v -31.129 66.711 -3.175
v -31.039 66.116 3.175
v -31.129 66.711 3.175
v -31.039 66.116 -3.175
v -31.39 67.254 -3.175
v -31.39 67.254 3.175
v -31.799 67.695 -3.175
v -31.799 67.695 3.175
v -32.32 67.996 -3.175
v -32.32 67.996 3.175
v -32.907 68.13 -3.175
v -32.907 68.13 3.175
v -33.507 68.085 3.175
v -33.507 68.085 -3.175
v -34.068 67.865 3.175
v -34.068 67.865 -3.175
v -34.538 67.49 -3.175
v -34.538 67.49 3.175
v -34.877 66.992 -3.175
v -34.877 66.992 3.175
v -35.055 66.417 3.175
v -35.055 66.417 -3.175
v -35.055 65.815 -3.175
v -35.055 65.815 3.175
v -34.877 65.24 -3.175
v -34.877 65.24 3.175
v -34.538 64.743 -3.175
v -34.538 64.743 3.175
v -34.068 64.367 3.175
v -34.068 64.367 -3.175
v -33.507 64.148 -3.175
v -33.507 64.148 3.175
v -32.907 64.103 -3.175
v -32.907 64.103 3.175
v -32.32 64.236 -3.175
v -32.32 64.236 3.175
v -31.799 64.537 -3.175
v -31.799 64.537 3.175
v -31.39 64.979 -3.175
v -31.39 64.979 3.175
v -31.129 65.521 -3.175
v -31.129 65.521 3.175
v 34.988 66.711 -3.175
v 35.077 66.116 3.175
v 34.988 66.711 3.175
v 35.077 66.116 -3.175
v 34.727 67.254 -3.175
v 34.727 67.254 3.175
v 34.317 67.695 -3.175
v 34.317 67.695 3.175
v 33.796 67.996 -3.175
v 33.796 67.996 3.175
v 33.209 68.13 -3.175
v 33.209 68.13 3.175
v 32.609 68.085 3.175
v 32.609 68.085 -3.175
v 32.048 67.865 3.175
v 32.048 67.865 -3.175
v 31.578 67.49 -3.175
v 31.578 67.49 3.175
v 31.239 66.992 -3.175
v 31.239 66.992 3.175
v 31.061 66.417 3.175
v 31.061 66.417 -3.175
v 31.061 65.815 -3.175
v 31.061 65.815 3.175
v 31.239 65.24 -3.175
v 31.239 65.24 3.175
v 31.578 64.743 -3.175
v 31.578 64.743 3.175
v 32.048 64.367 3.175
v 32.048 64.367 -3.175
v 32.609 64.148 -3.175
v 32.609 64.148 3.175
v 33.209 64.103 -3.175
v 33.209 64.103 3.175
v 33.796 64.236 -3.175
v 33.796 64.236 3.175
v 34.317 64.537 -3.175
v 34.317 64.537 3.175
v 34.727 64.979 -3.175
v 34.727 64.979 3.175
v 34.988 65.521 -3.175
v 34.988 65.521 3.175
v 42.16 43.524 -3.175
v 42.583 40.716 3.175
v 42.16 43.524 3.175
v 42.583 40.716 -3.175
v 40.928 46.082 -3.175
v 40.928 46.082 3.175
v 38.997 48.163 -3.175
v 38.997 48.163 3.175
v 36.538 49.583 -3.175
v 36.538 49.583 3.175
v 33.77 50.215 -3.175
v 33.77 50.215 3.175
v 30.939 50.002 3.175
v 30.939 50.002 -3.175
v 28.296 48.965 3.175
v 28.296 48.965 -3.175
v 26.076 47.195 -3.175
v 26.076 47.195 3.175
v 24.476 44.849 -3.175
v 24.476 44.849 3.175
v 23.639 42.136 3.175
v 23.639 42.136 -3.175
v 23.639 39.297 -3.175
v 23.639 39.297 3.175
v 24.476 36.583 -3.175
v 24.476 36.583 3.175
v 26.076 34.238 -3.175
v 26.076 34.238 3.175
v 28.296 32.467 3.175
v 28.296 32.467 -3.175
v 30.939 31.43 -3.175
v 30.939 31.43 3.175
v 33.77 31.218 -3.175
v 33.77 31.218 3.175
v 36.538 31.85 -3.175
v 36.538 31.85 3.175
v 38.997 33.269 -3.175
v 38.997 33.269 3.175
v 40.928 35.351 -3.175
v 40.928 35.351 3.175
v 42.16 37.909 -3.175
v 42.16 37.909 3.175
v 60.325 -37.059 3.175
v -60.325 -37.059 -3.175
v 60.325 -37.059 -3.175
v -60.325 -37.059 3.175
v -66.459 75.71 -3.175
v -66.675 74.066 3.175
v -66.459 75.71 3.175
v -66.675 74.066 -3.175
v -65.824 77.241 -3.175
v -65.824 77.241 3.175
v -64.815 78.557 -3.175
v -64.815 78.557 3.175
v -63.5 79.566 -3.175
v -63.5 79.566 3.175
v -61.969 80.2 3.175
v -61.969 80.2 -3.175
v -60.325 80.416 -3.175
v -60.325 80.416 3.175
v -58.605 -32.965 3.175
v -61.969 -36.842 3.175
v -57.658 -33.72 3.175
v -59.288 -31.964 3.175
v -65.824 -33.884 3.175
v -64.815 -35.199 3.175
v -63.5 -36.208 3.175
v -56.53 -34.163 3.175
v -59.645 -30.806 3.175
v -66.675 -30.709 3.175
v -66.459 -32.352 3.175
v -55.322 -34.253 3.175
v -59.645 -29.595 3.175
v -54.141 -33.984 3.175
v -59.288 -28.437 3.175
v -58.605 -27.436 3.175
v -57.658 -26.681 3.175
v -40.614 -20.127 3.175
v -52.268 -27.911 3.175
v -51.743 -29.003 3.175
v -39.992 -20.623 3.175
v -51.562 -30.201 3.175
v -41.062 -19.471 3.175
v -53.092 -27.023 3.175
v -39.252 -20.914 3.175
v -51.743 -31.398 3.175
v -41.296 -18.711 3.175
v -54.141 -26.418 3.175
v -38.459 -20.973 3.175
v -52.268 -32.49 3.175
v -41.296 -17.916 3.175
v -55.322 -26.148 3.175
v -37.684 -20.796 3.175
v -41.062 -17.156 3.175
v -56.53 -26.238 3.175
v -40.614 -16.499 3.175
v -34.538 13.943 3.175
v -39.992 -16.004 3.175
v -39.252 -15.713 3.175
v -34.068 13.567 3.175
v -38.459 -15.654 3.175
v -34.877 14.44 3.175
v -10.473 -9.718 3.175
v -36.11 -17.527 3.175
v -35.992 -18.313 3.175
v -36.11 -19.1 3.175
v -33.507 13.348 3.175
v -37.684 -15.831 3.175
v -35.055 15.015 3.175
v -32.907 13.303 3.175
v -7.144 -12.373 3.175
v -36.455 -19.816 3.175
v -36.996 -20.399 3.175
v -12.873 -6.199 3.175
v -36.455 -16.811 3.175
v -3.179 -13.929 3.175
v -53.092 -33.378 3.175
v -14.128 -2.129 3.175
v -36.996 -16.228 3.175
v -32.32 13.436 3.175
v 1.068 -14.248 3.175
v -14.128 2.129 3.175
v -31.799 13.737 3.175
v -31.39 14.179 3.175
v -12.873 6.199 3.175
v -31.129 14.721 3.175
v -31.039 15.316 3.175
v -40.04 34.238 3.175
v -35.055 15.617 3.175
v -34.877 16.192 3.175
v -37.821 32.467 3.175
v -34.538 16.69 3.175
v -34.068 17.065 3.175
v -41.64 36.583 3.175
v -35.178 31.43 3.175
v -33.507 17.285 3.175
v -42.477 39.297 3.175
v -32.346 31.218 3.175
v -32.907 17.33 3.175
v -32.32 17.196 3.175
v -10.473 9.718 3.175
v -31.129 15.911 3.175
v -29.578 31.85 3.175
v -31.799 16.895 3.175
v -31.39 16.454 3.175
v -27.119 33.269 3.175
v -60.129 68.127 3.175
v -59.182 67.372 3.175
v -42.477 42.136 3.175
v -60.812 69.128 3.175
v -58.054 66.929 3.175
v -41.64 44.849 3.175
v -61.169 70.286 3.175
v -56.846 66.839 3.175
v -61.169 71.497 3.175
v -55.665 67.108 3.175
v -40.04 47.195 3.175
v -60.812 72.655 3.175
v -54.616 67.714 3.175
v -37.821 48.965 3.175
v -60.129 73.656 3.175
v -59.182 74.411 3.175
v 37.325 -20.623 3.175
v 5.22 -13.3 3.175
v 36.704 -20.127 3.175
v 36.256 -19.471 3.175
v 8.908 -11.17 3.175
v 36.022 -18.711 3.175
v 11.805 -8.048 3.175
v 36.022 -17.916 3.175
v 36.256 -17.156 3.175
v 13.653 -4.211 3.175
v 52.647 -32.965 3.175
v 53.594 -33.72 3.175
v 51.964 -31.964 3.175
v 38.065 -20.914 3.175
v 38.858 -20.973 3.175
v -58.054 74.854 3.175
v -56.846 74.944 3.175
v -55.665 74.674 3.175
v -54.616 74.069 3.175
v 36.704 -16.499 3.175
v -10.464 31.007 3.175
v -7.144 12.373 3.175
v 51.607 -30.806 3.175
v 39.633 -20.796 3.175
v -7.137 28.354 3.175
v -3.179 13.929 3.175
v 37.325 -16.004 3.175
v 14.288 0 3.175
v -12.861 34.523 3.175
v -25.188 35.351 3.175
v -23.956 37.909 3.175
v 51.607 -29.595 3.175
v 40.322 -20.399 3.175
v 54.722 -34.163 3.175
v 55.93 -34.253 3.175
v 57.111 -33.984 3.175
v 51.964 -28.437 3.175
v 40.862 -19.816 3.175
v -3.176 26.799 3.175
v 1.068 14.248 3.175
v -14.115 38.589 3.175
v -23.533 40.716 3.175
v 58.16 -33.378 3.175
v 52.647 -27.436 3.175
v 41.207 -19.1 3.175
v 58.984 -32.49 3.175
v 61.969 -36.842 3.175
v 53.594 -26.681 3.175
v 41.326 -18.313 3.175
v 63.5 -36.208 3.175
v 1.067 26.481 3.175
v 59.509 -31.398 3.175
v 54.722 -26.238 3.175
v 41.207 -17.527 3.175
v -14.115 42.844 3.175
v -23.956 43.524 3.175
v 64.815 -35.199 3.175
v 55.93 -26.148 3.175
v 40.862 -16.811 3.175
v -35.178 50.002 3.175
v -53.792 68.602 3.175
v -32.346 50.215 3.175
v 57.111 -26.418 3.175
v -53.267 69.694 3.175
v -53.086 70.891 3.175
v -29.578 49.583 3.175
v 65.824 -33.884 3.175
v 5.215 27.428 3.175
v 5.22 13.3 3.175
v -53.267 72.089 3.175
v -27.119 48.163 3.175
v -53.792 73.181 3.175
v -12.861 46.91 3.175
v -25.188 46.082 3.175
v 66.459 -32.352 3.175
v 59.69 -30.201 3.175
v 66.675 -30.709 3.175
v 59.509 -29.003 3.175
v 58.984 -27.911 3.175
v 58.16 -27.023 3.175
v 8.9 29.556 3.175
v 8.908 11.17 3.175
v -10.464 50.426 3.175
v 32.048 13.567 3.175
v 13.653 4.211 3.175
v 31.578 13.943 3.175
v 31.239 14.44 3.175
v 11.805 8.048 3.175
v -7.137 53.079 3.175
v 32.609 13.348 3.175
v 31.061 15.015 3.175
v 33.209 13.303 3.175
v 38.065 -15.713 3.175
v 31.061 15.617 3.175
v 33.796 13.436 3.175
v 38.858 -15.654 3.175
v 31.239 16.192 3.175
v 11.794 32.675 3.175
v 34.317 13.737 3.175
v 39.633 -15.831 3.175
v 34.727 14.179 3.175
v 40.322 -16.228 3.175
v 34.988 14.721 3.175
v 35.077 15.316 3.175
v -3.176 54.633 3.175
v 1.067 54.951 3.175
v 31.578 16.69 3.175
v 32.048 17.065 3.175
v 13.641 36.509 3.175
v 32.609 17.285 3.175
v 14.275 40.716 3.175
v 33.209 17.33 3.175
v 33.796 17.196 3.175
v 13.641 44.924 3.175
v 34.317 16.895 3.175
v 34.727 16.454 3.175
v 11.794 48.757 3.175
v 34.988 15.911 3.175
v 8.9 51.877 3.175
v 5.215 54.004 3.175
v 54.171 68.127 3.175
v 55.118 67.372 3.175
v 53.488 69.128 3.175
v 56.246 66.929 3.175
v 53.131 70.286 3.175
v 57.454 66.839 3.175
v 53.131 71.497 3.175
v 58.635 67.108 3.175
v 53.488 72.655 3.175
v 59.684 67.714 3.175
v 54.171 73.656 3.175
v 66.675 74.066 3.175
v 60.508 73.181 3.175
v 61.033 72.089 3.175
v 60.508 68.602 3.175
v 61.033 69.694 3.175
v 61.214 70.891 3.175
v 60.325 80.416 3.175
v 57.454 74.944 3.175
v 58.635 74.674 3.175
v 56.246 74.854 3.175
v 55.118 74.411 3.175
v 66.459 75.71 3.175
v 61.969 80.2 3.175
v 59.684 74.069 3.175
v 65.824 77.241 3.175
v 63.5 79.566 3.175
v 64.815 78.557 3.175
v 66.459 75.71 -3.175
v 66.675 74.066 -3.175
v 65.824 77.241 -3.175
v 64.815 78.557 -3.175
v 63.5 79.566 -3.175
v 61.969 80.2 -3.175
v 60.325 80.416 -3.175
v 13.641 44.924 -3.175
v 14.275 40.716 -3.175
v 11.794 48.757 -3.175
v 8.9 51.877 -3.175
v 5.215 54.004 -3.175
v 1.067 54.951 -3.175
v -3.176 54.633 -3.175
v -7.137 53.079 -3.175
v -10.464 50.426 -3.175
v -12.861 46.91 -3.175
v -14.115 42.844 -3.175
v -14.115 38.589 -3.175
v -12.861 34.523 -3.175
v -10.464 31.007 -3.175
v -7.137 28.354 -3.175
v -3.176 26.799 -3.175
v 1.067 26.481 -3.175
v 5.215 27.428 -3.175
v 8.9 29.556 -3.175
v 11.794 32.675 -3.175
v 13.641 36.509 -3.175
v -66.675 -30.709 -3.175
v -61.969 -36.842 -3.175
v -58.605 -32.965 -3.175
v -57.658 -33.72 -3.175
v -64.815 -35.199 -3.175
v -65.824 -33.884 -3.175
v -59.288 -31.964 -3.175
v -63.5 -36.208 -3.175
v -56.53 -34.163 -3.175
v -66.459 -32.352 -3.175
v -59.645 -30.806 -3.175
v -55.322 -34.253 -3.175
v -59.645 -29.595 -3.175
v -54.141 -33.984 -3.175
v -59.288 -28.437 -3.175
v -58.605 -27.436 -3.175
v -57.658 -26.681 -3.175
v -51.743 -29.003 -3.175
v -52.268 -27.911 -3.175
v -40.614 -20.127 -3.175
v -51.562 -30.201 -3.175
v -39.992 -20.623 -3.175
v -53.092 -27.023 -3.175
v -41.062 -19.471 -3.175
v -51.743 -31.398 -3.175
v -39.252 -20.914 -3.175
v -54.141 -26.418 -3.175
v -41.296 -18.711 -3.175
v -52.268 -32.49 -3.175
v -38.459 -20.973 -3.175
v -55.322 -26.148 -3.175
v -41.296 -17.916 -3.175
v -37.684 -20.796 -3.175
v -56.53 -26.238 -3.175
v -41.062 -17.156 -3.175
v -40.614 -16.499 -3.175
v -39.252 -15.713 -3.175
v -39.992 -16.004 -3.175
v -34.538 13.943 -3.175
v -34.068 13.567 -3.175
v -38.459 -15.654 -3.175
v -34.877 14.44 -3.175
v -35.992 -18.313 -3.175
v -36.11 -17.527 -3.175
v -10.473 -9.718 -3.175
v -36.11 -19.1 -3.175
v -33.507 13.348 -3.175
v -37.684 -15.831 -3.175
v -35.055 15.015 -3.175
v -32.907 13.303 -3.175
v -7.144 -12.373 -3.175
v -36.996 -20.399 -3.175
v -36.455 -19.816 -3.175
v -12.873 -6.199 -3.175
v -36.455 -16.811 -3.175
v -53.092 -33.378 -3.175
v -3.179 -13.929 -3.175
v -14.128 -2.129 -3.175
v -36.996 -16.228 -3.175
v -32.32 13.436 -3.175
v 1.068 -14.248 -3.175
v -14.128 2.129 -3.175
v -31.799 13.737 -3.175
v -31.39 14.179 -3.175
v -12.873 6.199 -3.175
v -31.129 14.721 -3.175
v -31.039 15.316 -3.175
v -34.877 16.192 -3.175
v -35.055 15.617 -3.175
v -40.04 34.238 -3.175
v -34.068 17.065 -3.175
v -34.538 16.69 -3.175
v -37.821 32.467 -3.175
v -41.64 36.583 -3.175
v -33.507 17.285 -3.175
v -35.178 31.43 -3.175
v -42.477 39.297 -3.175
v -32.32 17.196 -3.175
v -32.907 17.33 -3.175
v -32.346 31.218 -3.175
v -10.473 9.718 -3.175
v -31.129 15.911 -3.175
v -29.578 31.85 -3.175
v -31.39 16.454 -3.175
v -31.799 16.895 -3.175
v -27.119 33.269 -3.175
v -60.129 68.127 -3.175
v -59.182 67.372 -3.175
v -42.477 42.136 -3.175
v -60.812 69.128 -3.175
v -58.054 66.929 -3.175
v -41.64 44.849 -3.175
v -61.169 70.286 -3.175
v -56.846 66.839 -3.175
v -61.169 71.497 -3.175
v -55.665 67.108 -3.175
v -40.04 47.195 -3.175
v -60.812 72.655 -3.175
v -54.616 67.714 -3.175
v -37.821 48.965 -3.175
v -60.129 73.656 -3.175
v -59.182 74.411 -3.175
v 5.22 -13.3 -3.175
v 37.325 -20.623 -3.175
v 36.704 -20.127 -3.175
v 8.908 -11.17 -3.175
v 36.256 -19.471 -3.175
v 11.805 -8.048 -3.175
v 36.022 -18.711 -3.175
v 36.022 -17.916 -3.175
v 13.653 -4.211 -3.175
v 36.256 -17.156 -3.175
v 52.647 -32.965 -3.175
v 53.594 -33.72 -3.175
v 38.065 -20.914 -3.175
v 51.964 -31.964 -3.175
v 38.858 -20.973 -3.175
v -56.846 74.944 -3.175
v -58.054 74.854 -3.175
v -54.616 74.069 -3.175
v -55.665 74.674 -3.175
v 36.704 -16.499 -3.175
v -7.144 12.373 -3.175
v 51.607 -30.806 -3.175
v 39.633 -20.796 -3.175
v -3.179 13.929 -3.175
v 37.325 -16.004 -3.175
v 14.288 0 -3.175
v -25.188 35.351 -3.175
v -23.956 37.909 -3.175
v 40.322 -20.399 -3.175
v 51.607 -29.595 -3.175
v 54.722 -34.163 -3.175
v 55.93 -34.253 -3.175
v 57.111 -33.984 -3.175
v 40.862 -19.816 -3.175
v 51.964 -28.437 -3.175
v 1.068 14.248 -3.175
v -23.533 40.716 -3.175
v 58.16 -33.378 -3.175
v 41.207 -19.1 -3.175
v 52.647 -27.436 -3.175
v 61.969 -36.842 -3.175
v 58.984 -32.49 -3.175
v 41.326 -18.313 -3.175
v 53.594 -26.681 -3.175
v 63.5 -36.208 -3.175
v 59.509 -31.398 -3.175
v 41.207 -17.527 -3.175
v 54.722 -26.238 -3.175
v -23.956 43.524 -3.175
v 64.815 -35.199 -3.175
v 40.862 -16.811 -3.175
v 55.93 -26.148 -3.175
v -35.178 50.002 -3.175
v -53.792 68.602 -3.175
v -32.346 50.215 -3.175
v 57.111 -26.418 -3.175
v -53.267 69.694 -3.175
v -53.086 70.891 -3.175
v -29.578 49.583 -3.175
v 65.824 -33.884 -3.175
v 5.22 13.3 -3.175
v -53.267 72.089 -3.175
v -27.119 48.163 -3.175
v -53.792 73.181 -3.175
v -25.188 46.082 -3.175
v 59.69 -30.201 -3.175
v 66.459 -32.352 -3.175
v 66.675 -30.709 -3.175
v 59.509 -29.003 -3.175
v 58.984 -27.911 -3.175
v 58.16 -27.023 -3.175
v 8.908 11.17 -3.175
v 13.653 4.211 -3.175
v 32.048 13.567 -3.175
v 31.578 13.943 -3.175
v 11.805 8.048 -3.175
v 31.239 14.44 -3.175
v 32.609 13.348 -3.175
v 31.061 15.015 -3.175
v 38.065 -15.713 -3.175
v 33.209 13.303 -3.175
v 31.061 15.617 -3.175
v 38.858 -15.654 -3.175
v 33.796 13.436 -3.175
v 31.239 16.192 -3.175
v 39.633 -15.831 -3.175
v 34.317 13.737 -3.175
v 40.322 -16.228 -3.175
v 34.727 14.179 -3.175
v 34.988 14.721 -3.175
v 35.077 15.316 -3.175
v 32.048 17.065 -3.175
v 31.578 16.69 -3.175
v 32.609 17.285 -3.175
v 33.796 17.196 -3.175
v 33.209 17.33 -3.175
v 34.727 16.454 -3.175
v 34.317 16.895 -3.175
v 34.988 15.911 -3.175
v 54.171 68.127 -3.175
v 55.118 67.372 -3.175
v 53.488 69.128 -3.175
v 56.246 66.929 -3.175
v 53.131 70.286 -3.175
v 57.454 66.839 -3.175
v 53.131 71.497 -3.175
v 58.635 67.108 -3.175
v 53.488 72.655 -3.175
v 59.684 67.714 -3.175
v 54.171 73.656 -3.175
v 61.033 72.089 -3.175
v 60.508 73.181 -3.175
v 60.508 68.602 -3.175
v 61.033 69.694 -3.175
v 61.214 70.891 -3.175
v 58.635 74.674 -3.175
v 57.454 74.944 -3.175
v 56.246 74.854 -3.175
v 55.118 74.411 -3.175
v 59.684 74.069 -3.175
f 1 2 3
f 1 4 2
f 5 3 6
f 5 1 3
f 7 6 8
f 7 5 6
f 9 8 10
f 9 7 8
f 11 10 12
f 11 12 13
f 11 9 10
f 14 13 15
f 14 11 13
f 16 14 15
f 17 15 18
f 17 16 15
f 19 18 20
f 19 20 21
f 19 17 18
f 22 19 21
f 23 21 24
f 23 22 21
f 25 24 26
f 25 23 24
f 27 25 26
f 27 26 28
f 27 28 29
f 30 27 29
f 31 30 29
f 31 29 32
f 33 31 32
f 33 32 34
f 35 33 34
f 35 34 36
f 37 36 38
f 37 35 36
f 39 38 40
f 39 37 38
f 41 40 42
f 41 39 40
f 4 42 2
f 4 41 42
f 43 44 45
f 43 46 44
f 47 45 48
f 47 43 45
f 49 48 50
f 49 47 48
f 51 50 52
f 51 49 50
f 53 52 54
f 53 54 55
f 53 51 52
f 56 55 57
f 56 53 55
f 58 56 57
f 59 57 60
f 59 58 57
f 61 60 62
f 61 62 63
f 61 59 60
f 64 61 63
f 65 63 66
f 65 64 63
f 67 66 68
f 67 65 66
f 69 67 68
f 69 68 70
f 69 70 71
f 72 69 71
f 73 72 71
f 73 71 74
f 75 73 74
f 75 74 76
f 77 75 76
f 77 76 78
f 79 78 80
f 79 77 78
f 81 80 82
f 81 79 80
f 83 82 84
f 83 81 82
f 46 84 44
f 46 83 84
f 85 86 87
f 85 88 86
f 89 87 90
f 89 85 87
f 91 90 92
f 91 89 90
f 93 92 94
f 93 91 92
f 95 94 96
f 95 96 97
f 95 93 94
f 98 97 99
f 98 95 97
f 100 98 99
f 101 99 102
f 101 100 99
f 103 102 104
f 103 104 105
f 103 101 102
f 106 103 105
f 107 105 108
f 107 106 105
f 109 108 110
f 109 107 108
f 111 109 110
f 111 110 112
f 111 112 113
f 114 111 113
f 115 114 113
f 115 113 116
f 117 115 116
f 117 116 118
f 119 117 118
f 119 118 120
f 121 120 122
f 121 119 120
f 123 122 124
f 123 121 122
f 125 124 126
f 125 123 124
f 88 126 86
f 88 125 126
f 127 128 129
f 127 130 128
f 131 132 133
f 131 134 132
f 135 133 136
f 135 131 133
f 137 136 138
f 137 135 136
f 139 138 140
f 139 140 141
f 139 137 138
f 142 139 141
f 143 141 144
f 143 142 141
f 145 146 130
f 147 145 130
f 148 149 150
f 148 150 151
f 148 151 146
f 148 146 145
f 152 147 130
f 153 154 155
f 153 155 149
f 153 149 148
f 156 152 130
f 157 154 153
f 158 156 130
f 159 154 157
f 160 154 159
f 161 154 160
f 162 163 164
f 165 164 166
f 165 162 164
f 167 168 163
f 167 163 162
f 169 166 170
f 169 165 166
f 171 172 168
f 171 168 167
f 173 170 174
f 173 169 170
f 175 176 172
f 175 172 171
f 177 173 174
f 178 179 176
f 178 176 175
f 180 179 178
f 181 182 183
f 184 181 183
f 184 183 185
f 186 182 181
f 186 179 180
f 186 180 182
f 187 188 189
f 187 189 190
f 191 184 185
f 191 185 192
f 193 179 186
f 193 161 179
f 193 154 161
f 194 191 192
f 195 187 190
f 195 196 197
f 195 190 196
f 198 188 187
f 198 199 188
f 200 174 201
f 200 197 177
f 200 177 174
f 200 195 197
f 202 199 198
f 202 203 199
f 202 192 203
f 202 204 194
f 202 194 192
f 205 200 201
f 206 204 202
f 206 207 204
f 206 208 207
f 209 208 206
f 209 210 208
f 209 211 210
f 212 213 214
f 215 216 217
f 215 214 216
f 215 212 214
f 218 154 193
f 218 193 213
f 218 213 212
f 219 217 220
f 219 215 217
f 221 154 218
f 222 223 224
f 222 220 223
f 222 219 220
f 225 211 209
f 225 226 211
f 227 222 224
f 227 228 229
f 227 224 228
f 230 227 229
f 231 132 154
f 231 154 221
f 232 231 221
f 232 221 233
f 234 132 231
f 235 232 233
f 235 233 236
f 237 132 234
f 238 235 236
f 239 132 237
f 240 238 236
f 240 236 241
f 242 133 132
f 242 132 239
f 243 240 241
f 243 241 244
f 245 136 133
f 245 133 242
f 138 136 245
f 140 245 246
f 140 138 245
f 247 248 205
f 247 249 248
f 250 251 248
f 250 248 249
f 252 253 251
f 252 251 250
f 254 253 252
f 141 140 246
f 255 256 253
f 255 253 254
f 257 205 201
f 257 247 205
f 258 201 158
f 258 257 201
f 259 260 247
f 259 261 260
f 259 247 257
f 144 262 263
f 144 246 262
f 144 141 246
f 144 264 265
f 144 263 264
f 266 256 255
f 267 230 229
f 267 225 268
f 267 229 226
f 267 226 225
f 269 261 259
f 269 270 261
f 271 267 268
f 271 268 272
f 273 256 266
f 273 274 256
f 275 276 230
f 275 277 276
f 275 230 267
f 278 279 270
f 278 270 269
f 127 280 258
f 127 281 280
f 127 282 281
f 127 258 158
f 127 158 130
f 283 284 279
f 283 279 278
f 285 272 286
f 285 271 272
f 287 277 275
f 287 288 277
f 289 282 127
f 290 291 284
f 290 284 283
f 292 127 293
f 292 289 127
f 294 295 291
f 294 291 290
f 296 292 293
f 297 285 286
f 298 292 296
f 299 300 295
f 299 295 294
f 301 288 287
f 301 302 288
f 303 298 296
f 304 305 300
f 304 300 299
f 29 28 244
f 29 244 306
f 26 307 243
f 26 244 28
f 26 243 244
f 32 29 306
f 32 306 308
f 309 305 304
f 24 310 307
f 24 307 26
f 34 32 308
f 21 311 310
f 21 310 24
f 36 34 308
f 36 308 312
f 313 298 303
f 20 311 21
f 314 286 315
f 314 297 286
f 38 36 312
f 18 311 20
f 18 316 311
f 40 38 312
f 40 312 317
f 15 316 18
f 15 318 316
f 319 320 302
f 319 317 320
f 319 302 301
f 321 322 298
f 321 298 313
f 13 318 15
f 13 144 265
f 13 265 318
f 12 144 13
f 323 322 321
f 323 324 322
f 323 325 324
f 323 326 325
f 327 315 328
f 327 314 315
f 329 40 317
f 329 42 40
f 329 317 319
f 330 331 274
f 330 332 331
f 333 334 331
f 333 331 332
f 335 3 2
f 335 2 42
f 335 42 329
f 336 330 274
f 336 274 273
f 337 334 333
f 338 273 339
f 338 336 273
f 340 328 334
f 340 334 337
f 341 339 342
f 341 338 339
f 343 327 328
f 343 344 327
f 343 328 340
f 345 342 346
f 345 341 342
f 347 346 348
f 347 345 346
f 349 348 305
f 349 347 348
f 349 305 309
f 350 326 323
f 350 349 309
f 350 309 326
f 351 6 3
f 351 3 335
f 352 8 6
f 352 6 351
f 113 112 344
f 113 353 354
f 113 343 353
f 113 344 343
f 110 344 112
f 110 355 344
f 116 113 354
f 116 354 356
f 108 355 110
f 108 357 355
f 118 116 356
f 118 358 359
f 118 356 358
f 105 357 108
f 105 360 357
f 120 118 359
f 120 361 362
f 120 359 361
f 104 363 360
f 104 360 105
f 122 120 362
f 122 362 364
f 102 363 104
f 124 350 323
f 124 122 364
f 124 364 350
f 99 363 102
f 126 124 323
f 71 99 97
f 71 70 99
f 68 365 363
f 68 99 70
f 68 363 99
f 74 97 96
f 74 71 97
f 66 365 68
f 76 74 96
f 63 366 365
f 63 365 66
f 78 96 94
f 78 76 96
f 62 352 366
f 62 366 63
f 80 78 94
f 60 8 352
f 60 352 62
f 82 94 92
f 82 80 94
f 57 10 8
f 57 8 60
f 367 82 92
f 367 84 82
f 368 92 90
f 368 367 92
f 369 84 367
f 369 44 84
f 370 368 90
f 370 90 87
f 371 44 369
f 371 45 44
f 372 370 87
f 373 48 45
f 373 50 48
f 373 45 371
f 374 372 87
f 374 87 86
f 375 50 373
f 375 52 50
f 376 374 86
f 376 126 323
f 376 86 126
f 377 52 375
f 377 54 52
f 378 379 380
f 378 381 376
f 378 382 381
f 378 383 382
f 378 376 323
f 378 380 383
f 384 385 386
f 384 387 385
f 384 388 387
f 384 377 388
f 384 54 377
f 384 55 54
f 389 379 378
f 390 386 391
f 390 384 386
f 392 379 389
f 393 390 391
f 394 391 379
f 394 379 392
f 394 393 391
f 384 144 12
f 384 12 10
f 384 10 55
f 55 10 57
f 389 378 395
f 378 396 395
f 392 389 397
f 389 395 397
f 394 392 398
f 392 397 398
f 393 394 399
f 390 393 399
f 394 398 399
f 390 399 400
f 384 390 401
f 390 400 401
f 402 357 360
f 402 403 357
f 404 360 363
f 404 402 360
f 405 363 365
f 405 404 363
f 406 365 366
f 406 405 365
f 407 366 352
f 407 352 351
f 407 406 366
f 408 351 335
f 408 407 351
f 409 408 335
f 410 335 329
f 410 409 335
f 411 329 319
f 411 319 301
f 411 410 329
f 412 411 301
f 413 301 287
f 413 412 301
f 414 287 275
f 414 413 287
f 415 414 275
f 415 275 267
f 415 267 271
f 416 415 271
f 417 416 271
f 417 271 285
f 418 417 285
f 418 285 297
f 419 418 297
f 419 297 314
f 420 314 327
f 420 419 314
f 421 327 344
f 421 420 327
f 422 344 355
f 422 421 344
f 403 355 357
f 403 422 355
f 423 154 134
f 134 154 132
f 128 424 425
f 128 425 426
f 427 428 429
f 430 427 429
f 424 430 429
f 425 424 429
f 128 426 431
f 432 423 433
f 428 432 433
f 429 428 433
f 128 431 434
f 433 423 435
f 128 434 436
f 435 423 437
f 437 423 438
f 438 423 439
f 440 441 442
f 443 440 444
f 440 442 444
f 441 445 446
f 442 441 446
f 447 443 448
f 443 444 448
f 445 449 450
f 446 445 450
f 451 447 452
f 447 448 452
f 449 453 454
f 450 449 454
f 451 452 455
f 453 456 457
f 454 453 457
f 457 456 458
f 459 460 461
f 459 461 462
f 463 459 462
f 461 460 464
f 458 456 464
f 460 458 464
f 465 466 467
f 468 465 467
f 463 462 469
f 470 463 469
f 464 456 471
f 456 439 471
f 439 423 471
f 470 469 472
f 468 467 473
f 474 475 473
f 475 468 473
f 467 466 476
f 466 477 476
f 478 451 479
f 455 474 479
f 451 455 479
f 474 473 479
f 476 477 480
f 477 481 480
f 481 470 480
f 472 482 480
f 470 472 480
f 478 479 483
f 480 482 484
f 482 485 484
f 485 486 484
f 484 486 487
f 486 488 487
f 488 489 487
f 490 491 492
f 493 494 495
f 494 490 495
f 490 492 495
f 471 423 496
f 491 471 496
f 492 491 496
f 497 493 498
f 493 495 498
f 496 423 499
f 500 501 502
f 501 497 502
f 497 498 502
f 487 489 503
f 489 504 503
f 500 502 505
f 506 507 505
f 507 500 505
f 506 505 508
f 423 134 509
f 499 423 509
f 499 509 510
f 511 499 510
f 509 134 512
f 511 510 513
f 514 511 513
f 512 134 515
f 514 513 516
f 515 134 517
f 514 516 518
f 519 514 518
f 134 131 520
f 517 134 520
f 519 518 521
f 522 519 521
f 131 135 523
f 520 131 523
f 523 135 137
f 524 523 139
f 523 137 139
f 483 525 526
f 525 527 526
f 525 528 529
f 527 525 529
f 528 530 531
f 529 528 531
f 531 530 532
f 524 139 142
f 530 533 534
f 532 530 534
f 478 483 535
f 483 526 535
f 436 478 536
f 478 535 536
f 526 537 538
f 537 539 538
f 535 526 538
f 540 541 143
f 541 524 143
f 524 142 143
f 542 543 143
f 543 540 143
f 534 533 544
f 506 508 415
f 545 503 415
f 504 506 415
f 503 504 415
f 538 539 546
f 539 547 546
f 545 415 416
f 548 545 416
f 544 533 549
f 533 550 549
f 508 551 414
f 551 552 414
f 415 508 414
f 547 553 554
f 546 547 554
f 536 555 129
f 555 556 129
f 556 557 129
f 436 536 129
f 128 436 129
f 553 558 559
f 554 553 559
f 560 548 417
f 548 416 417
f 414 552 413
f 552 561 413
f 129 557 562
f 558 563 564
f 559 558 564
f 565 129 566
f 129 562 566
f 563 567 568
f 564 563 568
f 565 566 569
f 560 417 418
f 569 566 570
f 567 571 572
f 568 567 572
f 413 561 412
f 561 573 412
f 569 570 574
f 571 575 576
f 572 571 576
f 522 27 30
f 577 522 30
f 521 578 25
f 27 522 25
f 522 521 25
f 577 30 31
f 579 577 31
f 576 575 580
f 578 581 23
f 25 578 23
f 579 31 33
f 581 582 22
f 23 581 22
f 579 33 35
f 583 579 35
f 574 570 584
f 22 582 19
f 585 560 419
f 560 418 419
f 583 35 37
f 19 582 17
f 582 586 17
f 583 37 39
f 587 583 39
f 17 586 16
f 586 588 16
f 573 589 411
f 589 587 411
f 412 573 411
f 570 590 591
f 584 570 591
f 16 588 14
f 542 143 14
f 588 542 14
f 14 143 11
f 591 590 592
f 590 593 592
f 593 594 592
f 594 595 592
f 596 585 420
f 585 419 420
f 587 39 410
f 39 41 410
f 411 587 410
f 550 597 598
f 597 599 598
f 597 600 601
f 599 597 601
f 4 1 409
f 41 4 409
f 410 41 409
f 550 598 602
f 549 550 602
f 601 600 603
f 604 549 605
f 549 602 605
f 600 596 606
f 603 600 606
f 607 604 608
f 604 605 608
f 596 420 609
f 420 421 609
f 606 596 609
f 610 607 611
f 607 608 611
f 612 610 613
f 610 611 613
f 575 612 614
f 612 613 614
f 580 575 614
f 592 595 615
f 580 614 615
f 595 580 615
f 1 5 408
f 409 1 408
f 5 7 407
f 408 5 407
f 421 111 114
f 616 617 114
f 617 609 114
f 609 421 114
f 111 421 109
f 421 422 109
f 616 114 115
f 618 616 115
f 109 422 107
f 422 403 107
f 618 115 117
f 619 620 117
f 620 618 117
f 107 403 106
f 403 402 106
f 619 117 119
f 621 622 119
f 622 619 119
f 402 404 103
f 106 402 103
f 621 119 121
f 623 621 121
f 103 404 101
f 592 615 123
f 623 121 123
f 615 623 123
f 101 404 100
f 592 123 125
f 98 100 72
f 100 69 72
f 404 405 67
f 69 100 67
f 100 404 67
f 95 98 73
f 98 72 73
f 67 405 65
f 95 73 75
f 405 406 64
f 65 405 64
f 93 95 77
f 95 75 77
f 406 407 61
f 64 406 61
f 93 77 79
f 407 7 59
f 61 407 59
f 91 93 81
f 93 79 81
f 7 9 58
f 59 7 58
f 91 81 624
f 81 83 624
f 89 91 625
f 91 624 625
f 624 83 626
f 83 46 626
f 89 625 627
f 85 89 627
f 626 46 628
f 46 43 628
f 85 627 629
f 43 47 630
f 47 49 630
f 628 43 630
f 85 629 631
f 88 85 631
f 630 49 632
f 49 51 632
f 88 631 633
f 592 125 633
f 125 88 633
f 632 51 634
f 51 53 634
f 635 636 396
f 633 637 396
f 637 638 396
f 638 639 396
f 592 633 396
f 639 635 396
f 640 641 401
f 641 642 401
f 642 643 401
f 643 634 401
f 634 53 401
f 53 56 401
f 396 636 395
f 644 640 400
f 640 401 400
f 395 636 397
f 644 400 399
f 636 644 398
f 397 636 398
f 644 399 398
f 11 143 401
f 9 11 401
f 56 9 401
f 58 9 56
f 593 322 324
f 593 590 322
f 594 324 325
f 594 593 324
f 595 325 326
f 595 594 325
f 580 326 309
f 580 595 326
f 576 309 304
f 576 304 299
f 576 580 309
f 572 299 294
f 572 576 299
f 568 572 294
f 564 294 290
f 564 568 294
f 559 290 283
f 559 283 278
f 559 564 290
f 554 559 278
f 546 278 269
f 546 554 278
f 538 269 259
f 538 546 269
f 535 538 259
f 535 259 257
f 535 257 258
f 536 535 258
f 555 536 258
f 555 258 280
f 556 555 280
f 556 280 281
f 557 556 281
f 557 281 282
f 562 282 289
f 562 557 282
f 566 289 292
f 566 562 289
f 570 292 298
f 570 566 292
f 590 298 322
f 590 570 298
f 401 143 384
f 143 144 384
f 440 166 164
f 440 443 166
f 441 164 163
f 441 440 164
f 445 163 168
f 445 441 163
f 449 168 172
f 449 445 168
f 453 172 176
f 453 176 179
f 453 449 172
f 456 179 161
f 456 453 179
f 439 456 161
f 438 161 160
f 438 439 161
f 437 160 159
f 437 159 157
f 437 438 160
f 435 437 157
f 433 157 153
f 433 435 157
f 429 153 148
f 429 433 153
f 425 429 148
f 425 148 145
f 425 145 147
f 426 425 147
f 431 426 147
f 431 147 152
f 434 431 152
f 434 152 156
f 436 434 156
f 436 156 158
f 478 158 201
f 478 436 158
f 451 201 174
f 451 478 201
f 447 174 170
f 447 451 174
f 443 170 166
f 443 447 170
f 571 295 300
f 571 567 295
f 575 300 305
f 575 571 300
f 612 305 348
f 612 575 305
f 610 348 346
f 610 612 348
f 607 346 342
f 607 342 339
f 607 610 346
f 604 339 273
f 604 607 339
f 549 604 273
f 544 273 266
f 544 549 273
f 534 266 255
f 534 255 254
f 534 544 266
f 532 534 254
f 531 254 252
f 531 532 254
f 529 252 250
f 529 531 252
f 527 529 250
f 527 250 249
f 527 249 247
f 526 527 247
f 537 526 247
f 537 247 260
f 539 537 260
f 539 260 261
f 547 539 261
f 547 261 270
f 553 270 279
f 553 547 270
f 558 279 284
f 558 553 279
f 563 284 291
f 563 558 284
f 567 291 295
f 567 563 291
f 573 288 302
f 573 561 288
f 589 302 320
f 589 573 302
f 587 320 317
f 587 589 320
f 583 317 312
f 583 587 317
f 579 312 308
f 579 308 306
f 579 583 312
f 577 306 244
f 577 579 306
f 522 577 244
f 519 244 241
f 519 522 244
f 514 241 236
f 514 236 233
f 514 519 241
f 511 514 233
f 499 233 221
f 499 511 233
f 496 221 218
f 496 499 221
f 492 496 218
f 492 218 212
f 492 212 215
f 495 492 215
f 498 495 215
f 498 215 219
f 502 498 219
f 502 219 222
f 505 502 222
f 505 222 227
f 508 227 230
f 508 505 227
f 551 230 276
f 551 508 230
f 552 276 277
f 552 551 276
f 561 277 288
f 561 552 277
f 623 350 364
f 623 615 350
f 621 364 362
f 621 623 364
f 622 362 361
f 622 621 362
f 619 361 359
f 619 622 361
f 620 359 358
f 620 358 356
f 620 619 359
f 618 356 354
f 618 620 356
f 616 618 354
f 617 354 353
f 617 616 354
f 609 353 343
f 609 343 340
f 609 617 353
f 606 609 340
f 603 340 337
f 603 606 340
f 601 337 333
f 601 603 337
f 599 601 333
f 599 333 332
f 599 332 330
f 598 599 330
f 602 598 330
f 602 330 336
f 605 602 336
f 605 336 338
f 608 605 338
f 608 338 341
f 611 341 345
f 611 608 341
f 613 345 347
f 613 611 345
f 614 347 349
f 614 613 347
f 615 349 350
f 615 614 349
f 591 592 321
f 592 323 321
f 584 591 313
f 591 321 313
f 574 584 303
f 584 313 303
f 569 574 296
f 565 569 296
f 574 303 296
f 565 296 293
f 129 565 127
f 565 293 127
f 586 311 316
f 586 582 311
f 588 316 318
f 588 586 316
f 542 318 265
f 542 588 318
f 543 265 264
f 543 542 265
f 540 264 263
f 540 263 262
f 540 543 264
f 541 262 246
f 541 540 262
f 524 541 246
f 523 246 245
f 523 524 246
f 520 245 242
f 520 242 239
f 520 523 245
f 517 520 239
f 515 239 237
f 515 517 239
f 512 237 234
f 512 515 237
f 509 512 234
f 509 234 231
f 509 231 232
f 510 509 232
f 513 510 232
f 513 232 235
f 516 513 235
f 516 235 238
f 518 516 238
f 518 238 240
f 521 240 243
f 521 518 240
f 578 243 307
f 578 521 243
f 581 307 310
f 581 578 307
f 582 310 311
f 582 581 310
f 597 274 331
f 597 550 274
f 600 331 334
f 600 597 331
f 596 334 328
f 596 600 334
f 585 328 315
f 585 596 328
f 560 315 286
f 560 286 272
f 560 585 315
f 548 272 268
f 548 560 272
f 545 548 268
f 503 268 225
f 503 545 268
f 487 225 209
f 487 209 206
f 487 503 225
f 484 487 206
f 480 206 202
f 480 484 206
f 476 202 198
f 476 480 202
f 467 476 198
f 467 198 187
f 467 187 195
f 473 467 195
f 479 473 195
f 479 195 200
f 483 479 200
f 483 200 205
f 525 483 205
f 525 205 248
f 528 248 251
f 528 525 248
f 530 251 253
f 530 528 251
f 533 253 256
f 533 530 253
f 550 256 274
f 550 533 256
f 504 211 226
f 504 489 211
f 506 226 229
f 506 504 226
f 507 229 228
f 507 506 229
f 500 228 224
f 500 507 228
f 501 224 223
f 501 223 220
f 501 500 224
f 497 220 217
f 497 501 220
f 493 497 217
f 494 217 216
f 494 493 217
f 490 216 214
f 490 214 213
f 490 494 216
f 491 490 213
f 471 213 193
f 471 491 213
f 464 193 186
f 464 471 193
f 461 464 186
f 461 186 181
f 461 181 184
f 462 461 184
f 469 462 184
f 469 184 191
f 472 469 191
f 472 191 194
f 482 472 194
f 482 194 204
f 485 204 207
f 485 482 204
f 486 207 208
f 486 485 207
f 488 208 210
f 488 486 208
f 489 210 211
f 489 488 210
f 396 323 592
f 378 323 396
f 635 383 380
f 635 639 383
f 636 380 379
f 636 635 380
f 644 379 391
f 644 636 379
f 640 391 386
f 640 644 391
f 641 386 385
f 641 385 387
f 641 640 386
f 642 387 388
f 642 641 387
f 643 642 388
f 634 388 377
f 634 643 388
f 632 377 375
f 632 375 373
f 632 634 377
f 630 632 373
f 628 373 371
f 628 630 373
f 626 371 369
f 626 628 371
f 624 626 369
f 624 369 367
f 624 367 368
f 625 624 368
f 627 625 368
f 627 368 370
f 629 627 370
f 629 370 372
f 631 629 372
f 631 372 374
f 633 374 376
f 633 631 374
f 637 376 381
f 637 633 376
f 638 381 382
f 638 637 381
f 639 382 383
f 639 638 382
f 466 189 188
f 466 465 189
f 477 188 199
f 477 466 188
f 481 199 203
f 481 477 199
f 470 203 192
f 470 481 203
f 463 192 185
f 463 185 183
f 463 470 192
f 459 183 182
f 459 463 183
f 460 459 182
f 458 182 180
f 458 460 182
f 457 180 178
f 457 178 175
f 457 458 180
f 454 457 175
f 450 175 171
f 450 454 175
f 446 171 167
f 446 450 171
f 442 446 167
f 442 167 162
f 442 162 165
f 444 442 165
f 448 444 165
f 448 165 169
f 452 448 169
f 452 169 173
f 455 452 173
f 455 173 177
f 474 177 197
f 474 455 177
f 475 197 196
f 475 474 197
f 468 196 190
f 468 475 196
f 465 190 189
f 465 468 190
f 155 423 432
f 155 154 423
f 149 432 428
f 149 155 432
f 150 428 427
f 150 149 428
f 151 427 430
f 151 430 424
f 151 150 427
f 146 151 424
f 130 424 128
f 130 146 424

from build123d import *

# Parameters (mm, degrees)
SKETCH1_W           = 133.35
SKETCH1_H           = 117.475
SKETCH1_R           = 14.2748
SKETCH1_R_2         = 9.525
SKETCH1_R_3         = 2.0193
SKETCH1_R_4         = 14.2875
SKETCH1_R_5         = 4.064
SKETCH1_R_6         = 2.667
BOSS_EXTRUDE1_DEPTH = 3.175
FILLET1_R           = 6.35


with BuildPart() as part:
    # Sketch1 → Boss-Extrude1 (new, symmetric)
    with BuildSketch(Plane.XY):
        with Locations((0, 21.6789)):
            Rectangle(SKETCH1_W, SKETCH1_H)
        with Locations((0, 40.7162)):
            Circle(SKETCH1_R, mode=Mode.SUBTRACT)
        with Locations((33.0581, 40.7162)):
            Circle(SKETCH1_R_2, mode=Mode.SUBTRACT)
        with Locations((-33.0581, 40.7162)):
            Circle(SKETCH1_R_2, mode=Mode.SUBTRACT)
        with Locations((-33.0581, 66.1162)):
            Circle(SKETCH1_R_3, mode=Mode.SUBTRACT)
        with Locations((-33.0581, 15.3162)):
            Circle(SKETCH1_R_3, mode=Mode.SUBTRACT)
        Circle(SKETCH1_R_4, mode=Mode.SUBTRACT)
        with Locations((-57.15, 70.8914)):
            Circle(SKETCH1_R_5, mode=Mode.SUBTRACT)
        with Locations((-55.626, -30.2006)):
            Circle(SKETCH1_R_5, mode=Mode.SUBTRACT)
        with Locations((57.15, 70.8914)):
            Circle(SKETCH1_R_5, mode=Mode.SUBTRACT)
        with Locations((55.626, -30.2006)):
            Circle(SKETCH1_R_5, mode=Mode.SUBTRACT)
        with Locations((38.6588, -18.3134)):
            Circle(SKETCH1_R_6, mode=Mode.SUBTRACT)
        with Locations((-38.6588, -18.3134)):
            Circle(SKETCH1_R_6, mode=Mode.SUBTRACT)
        with Locations((33.0581, 66.1162)):
            Circle(SKETCH1_R_3, mode=Mode.SUBTRACT)
        with Locations((33.0581, 15.3162)):
            Circle(SKETCH1_R_3, mode=Mode.SUBTRACT)
    extrude(amount=BOSS_EXTRUDE1_DEPTH, both=True)

    # Fillet1
    fillet1_edges = [part.edges().sort_by_distance(p)[0] for p in [
        (66.675, -37.0586, 0),
        (-66.675, -37.0586, 0),
        (-66.675, 80.4164, 0),
        (66.675, 80.4164, 0),
    ]]
    fillet(fillet1_edges, radius=FILLET1_R)


solid = part.part
